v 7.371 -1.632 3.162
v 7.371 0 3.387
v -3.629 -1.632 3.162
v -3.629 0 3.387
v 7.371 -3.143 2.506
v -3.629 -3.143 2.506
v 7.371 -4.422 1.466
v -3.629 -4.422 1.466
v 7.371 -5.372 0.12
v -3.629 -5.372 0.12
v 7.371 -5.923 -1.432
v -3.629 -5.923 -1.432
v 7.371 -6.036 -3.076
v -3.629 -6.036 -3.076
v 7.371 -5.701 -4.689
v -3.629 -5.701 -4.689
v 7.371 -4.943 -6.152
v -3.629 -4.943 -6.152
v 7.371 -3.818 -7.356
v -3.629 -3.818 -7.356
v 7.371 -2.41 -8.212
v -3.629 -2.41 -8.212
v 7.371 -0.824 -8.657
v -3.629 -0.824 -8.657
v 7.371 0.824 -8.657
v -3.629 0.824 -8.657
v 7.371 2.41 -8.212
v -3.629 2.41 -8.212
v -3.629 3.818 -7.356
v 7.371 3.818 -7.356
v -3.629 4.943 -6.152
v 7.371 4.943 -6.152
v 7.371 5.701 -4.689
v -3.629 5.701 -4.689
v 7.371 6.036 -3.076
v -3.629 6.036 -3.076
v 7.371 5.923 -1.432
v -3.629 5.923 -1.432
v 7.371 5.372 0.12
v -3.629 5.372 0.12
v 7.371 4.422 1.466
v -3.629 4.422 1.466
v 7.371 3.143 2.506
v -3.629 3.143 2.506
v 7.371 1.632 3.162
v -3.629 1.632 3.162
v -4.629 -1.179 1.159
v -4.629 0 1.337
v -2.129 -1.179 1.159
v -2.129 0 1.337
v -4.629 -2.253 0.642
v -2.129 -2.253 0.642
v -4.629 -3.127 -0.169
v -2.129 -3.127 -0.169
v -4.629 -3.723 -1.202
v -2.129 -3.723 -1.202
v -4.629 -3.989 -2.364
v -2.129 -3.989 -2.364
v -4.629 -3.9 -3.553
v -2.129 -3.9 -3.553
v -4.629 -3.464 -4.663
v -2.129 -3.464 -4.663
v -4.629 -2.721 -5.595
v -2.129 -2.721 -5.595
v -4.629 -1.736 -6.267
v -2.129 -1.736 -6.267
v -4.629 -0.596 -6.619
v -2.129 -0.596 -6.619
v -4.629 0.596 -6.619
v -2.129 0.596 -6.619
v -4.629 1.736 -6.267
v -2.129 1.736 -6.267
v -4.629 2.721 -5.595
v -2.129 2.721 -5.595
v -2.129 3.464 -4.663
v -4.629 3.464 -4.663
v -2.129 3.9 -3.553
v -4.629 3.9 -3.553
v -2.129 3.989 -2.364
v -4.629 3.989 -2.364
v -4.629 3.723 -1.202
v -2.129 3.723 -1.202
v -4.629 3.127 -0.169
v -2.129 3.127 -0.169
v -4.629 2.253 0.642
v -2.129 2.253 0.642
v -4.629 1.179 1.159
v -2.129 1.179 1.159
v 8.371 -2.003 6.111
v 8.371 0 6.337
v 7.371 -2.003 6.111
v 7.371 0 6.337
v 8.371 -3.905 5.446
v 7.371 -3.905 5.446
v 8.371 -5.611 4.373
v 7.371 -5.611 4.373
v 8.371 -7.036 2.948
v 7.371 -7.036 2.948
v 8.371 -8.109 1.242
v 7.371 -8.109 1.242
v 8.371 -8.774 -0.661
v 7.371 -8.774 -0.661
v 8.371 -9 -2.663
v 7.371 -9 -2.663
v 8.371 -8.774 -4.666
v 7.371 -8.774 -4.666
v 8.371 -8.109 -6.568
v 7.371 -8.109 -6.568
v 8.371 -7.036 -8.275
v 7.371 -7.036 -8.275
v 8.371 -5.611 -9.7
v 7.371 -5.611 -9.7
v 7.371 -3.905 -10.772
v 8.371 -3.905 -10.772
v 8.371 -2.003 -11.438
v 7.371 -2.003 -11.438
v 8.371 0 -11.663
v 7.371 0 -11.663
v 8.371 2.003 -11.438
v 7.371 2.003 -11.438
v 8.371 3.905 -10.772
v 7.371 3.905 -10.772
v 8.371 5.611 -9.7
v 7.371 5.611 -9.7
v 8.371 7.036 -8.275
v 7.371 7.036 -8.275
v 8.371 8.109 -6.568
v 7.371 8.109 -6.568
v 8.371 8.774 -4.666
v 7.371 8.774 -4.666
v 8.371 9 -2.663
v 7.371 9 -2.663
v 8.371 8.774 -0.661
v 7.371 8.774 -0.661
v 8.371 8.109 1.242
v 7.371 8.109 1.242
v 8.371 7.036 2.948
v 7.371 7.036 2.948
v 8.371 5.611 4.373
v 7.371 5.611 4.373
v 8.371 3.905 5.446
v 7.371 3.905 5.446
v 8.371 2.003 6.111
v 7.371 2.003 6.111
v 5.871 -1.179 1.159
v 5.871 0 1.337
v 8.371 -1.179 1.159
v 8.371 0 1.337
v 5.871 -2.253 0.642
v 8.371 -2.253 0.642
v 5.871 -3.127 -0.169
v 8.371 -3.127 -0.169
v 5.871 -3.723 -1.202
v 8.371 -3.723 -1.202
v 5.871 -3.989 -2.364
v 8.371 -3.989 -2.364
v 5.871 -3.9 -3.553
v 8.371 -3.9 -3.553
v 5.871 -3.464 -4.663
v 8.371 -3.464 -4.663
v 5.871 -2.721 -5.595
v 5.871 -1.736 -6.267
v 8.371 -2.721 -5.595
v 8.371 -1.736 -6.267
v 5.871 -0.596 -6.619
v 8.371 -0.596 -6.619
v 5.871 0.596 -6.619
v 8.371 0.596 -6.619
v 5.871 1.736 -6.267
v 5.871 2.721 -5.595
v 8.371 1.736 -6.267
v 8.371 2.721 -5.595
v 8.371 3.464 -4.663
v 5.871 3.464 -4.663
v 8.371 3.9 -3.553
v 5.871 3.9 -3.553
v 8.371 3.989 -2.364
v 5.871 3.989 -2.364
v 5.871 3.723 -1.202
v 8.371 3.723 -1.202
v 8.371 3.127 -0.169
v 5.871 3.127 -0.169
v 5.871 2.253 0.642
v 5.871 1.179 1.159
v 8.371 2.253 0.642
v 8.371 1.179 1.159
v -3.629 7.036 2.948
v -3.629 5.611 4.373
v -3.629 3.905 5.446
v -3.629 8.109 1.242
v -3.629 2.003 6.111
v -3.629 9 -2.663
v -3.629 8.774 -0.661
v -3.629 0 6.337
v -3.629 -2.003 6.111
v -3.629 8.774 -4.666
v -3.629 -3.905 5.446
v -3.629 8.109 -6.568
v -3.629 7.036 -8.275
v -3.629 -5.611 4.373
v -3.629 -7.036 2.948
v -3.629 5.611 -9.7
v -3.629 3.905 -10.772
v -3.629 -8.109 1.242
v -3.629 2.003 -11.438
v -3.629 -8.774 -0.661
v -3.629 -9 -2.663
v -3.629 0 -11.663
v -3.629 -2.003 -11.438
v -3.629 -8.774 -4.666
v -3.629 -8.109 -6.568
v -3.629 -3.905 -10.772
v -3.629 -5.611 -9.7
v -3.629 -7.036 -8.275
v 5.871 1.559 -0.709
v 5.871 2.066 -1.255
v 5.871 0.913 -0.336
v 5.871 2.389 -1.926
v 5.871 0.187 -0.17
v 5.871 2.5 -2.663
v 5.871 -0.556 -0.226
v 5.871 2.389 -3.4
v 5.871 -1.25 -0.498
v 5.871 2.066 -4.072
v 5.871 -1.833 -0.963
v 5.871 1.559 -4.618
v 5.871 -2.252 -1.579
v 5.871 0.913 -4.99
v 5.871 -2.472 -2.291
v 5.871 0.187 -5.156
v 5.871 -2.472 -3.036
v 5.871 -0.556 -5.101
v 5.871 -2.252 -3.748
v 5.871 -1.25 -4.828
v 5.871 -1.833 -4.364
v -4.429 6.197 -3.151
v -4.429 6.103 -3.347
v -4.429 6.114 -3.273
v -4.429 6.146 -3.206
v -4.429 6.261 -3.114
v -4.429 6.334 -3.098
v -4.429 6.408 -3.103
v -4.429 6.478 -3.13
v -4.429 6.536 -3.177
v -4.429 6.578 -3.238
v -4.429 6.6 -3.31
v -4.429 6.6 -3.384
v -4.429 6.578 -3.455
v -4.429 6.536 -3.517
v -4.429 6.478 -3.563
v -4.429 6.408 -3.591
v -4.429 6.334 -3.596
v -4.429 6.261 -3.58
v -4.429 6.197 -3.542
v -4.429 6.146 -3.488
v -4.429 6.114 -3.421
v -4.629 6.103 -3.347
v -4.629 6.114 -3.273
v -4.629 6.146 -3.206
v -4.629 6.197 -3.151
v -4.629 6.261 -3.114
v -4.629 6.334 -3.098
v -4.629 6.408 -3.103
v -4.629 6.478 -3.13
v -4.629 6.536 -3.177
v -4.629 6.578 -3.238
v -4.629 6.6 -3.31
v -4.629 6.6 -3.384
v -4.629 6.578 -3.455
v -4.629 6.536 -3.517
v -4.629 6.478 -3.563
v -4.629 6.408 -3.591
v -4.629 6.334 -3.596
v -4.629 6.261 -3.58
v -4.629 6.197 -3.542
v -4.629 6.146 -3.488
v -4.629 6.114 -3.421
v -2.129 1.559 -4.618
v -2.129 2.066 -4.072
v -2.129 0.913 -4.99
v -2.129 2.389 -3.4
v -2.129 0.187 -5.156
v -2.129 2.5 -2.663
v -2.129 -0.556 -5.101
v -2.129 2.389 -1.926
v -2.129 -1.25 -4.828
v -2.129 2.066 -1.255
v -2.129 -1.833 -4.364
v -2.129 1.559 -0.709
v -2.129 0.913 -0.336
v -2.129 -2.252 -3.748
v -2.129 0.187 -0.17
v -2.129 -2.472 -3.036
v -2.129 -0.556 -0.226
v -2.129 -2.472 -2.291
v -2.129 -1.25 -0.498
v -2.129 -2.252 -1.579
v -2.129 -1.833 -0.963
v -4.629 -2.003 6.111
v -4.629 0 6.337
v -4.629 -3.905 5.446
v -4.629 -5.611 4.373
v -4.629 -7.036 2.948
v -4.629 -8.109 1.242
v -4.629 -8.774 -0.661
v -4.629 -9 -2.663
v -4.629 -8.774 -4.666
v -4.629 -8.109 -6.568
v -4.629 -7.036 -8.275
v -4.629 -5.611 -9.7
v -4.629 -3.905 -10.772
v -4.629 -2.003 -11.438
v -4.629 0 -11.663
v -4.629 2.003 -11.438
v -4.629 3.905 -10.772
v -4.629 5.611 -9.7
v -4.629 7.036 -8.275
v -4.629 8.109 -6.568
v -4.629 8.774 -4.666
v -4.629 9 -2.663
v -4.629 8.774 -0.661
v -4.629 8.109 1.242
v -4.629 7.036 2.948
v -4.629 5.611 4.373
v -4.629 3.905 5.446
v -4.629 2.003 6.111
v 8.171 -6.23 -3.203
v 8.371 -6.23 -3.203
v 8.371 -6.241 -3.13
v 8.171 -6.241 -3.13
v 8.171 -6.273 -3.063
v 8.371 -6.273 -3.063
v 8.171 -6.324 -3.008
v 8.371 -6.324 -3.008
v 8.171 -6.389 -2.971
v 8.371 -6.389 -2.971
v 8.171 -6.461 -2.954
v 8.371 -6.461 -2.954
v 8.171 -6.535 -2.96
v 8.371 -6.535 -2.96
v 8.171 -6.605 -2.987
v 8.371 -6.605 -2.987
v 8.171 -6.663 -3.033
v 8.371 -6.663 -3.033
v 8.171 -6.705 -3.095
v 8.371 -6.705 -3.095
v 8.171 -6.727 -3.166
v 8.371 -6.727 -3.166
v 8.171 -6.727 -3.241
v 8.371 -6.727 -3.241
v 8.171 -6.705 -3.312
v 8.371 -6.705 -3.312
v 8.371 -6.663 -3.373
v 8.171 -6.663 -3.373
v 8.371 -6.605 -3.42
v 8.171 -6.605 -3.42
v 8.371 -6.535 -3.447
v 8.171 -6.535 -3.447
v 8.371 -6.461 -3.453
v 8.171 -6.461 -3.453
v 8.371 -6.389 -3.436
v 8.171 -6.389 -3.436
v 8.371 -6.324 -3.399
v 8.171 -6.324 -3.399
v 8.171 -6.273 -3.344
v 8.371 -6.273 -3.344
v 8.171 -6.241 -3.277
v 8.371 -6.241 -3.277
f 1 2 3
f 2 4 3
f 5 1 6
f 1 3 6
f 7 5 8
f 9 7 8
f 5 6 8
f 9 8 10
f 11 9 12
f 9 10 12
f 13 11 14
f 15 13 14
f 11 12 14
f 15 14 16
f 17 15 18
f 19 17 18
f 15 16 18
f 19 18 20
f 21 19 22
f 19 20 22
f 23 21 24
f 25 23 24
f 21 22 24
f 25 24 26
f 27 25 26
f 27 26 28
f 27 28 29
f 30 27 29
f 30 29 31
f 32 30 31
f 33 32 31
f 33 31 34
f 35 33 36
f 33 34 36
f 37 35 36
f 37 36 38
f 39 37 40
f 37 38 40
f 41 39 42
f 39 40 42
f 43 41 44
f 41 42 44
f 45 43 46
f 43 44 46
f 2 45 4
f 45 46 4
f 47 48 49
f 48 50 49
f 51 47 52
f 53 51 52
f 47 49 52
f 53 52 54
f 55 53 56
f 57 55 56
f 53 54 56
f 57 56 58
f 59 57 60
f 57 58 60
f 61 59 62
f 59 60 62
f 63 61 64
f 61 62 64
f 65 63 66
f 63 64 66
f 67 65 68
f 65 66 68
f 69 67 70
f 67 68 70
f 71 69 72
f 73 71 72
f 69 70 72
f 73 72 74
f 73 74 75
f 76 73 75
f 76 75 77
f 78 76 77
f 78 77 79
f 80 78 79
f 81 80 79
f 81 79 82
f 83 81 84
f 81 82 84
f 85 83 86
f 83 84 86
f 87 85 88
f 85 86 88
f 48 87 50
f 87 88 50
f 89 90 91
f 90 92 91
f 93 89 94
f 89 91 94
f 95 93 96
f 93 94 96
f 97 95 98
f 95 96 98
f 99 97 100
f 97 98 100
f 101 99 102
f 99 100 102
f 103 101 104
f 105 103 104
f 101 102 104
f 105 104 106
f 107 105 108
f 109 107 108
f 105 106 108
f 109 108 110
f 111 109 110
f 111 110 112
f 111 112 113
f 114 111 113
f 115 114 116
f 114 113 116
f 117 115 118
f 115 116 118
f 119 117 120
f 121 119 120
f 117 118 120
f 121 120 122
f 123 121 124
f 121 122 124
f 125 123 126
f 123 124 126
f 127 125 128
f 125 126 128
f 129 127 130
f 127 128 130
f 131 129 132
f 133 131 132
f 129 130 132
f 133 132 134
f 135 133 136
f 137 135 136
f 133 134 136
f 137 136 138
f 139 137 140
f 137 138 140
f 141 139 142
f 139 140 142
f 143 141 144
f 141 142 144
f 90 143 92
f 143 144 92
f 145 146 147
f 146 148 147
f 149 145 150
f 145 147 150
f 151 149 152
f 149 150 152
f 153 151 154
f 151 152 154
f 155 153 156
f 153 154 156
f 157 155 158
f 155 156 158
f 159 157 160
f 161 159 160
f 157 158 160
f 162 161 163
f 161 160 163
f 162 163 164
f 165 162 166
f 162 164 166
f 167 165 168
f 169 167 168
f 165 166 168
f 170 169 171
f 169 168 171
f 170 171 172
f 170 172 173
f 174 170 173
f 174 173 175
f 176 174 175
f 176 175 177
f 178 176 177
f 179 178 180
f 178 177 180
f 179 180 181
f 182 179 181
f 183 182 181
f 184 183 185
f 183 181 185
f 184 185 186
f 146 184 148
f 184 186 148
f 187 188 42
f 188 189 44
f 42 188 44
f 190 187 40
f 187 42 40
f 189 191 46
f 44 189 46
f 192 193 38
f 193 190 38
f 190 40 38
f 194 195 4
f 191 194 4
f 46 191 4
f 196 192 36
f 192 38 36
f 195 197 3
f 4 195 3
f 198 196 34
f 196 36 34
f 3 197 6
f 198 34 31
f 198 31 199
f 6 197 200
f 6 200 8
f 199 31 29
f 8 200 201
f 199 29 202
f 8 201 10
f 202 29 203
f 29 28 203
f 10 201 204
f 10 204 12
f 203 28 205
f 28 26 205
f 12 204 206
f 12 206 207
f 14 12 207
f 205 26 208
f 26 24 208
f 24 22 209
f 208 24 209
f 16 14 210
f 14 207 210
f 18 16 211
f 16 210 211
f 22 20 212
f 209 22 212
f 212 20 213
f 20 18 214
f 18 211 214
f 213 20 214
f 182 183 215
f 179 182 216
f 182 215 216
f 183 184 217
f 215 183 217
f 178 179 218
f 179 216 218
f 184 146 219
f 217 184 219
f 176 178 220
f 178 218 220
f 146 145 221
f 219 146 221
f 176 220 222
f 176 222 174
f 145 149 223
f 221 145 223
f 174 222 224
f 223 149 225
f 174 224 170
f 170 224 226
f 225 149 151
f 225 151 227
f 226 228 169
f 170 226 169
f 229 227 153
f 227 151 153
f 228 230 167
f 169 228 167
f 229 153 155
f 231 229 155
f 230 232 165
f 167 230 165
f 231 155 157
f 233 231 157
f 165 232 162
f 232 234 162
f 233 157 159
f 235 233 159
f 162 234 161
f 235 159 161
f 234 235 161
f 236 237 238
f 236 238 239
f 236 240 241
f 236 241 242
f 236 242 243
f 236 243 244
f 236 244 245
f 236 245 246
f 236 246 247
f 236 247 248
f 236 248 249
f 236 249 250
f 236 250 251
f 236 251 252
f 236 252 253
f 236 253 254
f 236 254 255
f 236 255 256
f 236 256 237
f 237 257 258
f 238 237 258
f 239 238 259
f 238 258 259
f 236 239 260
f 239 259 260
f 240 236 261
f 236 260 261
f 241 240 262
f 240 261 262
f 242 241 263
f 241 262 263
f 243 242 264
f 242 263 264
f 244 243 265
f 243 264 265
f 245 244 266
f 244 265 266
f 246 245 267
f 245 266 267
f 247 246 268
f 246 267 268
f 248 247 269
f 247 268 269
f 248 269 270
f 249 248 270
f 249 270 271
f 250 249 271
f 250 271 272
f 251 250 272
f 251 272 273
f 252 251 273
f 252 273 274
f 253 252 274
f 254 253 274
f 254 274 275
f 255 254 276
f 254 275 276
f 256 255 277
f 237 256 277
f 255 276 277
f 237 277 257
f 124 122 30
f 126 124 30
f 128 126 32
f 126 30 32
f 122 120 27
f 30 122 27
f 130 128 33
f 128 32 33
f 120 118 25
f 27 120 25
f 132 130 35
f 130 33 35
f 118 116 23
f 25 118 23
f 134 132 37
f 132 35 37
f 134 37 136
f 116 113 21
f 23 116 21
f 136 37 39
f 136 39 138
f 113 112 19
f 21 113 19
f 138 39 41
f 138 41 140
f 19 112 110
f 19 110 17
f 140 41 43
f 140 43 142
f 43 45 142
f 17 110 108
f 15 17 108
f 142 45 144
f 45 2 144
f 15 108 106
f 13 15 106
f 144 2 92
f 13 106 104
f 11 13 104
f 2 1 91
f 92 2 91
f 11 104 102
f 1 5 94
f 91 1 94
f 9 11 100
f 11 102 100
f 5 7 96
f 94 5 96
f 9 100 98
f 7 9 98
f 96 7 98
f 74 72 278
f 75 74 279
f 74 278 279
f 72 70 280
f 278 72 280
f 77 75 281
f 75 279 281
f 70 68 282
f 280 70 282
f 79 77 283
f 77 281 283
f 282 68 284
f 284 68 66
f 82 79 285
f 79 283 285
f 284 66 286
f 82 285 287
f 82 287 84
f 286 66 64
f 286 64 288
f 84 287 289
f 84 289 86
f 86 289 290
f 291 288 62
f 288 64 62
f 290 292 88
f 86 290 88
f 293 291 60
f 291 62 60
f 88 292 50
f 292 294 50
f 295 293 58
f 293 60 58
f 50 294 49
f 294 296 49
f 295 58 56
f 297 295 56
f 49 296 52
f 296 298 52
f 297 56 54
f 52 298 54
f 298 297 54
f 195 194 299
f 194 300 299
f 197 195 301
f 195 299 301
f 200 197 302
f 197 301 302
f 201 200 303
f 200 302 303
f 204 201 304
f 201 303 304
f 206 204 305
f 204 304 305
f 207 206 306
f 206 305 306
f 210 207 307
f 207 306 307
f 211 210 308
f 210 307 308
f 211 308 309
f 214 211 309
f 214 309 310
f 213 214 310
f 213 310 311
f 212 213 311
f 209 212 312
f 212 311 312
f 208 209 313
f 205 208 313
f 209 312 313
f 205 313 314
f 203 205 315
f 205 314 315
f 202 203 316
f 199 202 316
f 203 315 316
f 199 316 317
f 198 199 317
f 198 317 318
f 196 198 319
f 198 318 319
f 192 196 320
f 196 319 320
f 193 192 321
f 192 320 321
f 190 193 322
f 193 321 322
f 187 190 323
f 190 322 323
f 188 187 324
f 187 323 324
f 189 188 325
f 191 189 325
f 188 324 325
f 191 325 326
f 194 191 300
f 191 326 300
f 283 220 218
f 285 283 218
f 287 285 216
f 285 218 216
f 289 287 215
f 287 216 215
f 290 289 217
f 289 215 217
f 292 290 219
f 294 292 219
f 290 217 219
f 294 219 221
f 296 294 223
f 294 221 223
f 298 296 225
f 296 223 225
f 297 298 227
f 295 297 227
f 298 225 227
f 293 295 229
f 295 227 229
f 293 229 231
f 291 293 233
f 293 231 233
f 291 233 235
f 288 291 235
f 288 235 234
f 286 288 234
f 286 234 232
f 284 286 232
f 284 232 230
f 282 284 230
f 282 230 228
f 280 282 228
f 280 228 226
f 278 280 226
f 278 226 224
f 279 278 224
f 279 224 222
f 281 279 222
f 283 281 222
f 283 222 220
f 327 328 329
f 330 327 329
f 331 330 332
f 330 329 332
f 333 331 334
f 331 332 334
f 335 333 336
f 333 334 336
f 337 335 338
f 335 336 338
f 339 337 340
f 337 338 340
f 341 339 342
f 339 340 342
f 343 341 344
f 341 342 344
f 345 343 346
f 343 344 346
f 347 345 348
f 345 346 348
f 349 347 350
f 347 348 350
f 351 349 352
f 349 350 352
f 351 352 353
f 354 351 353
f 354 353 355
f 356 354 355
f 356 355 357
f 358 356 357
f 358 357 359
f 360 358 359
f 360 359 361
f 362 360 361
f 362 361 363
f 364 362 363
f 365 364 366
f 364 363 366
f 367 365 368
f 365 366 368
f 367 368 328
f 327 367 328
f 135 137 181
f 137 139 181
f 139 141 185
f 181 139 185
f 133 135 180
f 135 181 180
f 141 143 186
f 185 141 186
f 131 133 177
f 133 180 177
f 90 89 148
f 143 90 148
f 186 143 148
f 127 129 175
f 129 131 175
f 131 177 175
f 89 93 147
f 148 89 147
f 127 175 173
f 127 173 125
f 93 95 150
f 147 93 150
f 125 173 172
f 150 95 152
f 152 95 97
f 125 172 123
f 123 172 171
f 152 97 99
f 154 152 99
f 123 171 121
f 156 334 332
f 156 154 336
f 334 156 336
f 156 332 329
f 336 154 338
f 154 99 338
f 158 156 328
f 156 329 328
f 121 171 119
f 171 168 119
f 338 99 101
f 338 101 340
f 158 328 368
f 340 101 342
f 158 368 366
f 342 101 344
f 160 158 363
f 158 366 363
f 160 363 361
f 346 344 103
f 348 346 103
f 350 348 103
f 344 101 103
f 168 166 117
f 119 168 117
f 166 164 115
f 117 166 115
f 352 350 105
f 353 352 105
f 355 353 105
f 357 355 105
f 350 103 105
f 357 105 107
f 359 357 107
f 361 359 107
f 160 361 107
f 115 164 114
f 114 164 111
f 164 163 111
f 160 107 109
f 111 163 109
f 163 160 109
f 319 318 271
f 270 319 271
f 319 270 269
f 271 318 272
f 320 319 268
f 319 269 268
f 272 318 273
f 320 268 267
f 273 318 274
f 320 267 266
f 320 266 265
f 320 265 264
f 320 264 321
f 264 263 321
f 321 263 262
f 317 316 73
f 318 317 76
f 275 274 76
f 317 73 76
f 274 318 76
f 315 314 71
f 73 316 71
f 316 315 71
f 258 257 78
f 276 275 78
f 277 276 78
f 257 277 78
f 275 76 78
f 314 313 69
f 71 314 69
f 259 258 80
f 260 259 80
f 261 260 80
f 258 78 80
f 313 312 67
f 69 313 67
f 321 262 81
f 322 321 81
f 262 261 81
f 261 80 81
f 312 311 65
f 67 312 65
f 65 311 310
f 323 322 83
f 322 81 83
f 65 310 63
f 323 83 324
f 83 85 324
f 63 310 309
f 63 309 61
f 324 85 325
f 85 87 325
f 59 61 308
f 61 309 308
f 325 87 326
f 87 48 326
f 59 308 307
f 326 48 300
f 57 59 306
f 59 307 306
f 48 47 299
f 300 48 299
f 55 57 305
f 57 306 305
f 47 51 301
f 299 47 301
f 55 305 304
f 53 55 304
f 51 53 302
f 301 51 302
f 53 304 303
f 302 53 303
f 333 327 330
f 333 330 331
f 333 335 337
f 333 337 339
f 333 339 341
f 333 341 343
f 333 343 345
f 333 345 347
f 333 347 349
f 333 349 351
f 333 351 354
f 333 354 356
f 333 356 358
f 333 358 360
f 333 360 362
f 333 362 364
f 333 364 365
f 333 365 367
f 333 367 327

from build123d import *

# Parameters (mm, degrees)
F3_D     = 5
F4_R     = 0.25
F5_DEPTH = 0.2
F6_R     = 0.25
F7_DEPTH = 0.2


with BuildPart() as f1:
    # F0 (on Front) → F1 (revolve)
    with BuildSketch(Plane.XZ):
        Polygon((-3.628851, 6.336789), (-4.628851, 6.336789), (-4.628851, 1.336789), (-2.128851, 1.336789), (-2.128851, -2.663211), (5.871149, -2.663211), (5.871149, 1.336789), (8.371149, 1.336789), (8.371149, 6.336789), (7.371149, 6.336789), (7.371149, 3.386789), (-3.628851, 3.386789), align=None)
    revolve(axis=Axis((1.871149, 0, -2.663211), (1, 0, 0)))

    # F3 (through all)
    with Locations(Plane(origin=(-2.128851, 0, 0), x_dir=(0, -1, 0), z_dir=(-1, 0, 0))):
        with Locations((0, -2.663211)):
            Hole(F3_D / 2)

    # F4 (on face) → F5 (cut)
    with BuildSketch(Plane.YZ.offset(8.371149)):
        with Locations((-6.479844, -3.203344)):
            Circle(F4_R)
    extrude(amount=-F5_DEPTH, mode=Mode.SUBTRACT)

    # F6 (on face) → F7 (cut)
    with BuildSketch(Plane(origin=(-4.628851, 0, 0), x_dir=(0, -1, 0), z_dir=(-1, 0, 0))):
        with Locations((-6.352625, -3.346852)):
            Circle(F6_R)
    extrude(amount=-F7_DEPTH, mode=Mode.SUBTRACT)


solid = f1.part
